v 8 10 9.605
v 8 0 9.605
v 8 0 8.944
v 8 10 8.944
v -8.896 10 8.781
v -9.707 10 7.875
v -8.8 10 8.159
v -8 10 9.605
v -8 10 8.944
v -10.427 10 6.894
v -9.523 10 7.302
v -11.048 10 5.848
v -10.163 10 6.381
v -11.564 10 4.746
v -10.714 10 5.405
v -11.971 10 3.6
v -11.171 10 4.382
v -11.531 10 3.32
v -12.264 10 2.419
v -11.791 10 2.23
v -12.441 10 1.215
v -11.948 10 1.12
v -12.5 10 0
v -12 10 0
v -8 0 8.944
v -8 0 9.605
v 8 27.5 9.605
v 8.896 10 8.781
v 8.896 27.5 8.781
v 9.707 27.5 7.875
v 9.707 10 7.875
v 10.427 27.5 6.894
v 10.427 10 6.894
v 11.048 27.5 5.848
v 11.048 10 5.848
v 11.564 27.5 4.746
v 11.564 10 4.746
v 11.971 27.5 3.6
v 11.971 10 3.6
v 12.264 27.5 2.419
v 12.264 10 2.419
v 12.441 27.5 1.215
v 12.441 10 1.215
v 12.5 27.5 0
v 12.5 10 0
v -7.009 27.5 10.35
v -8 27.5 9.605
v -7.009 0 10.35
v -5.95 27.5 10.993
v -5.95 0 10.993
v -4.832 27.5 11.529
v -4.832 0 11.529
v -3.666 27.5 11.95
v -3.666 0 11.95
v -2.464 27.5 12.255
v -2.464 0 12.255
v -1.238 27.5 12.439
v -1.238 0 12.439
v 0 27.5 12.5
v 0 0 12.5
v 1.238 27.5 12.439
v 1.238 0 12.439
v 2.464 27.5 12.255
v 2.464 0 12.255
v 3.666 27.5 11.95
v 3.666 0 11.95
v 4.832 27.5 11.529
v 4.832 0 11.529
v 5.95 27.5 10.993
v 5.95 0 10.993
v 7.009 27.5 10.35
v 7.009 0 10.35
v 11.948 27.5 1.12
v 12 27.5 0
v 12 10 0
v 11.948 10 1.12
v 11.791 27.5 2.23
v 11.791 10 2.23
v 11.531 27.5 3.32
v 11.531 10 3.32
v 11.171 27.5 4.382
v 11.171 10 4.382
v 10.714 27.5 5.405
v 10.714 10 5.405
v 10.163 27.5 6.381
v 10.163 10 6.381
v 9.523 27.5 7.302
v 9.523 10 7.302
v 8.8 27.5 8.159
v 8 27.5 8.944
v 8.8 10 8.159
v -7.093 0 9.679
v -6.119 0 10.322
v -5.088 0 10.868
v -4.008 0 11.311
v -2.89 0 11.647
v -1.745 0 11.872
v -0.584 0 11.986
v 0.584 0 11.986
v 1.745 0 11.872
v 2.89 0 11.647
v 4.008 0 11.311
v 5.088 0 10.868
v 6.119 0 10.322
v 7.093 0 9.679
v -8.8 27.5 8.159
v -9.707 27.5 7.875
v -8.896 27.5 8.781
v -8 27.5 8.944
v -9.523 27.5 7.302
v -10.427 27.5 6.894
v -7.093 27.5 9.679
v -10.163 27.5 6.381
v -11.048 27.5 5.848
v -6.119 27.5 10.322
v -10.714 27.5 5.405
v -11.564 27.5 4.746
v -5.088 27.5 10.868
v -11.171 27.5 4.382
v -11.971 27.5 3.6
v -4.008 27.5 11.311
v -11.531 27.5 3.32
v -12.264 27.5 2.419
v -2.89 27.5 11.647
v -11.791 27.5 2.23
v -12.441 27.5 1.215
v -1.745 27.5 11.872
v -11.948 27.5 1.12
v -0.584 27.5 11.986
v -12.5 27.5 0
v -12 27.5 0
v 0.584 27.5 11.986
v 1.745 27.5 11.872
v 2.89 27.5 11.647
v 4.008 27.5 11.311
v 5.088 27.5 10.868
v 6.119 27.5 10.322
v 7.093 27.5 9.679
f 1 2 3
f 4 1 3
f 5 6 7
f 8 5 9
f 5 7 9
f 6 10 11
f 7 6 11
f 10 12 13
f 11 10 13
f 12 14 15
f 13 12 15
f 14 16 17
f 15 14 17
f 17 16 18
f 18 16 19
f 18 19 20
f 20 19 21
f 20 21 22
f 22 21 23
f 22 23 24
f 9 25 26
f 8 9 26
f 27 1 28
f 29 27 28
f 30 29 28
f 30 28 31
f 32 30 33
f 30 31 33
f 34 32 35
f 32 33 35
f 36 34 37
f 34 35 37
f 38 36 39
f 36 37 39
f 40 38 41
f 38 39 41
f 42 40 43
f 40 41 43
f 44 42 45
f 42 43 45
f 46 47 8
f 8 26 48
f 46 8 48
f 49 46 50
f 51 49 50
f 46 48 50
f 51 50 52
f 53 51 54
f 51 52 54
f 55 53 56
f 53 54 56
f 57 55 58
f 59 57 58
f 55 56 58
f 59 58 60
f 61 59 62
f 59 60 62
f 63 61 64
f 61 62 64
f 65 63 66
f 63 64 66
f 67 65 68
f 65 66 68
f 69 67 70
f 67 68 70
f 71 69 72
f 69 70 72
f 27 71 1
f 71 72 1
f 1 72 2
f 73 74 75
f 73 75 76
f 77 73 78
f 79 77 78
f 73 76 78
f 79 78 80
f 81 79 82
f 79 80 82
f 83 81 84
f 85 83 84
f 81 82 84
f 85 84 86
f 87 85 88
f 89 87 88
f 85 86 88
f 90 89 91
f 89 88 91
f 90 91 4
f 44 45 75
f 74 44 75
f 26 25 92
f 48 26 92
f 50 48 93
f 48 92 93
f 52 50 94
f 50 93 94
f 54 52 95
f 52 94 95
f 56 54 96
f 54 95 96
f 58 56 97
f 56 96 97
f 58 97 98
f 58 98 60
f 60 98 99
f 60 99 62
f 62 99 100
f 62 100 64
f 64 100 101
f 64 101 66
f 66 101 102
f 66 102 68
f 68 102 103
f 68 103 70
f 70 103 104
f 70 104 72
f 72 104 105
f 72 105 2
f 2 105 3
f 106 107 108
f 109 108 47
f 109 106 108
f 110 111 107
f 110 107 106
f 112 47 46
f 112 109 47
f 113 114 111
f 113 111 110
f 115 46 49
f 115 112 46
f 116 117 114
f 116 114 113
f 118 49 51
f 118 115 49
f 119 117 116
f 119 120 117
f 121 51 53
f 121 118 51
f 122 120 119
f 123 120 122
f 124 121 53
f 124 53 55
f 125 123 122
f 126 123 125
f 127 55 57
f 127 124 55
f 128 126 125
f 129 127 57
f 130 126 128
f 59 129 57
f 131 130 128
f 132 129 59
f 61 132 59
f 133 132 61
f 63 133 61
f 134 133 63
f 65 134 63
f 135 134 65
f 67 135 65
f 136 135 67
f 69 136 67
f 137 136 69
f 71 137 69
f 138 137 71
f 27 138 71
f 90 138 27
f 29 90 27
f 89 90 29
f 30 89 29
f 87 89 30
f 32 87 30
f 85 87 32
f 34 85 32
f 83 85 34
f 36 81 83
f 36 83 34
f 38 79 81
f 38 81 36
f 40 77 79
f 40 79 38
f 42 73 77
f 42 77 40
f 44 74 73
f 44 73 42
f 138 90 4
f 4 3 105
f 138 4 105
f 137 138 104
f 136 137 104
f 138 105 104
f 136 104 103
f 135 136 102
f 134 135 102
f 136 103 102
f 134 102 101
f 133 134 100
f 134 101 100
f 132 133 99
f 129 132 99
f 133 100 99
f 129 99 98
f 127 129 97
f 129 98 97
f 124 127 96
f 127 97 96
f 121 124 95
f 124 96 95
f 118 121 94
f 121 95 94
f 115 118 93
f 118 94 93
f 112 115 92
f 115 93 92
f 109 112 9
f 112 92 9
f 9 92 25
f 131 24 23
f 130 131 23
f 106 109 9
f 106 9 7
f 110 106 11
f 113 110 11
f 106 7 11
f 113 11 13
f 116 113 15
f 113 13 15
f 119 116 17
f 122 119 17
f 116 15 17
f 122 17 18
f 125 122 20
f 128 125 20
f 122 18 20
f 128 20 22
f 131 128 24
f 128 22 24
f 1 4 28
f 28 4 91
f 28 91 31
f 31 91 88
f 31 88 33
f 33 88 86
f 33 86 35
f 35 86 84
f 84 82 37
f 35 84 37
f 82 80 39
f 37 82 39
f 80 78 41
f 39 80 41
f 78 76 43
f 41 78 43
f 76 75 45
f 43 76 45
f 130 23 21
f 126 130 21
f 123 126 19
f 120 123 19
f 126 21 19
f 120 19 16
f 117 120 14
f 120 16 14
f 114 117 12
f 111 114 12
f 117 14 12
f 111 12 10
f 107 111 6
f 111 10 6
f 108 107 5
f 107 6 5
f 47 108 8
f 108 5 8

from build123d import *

# Parameters (mm, degrees)
BOSS_EXTRUDE1_DEPTH = 10
BOSS_EXTRUDE2_START = 10
BOSS_EXTRUDE2_DEPTH = 17.5


with BuildPart() as part:
    # Sketch1 → Boss-Extrude1 (new body)
    with BuildSketch(Plane(origin=(0, 0, 0), x_dir=(1, 0, 0), z_dir=(0, 1, 0))):
        with BuildLine():
            Line((-8, -8.94427191), (-8, -9.604686356))
            ThreePointArc((-8, -9.604686356), (0, -12.5), (8, -9.604686356))
            Line((8, -9.604686356), (8, -8.94427191))
            ThreePointArc((8, -8.94427191), (0, -12), (-8, -8.94427191))
        make_face()
    extrude(amount=BOSS_EXTRUDE1_DEPTH)

    # Sketch1<3> → Boss-Extrude2 (add)
    with BuildSketch(Plane(origin=(0, 0, 0), x_dir=(1, 0, 0), z_dir=(0, 1, 0)).offset(BOSS_EXTRUDE2_START)):
        with BuildLine():
            Line((-12, 0), (-12.5, 0))
            ThreePointArc((-12.5, 0), (-11.319231423, -5.303300859), (-8, -9.604686356))
            Line((-8, -9.604686356), (-8, -8.94427191))
            ThreePointArc((-8, -8.94427191), (-10.95445115, -4.898979486), (-12, 0))
        make_face()
        with BuildLine():
            Line((-8, -8.94427191), (-8, -9.604686356))
            ThreePointArc((-8, -9.604686356), (0, -12.5), (8, -9.604686356))
            Line((8, -9.604686356), (8, -8.94427191))
            ThreePointArc((8, -8.94427191), (0, -12), (-8, -8.94427191))
        make_face()
        with BuildLine():
            Line((8, -8.94427191), (8, -9.604686356))
            ThreePointArc((8, -9.604686356), (11.319231423, -5.303300859), (12.5, 0))
            Line((12.5, 0), (12, 0))
            ThreePointArc((12, 0), (10.95445115, -4.898979486), (8, -8.94427191))
        make_face()
    extrude(amount=BOSS_EXTRUDE2_DEPTH)


solid = part.part
